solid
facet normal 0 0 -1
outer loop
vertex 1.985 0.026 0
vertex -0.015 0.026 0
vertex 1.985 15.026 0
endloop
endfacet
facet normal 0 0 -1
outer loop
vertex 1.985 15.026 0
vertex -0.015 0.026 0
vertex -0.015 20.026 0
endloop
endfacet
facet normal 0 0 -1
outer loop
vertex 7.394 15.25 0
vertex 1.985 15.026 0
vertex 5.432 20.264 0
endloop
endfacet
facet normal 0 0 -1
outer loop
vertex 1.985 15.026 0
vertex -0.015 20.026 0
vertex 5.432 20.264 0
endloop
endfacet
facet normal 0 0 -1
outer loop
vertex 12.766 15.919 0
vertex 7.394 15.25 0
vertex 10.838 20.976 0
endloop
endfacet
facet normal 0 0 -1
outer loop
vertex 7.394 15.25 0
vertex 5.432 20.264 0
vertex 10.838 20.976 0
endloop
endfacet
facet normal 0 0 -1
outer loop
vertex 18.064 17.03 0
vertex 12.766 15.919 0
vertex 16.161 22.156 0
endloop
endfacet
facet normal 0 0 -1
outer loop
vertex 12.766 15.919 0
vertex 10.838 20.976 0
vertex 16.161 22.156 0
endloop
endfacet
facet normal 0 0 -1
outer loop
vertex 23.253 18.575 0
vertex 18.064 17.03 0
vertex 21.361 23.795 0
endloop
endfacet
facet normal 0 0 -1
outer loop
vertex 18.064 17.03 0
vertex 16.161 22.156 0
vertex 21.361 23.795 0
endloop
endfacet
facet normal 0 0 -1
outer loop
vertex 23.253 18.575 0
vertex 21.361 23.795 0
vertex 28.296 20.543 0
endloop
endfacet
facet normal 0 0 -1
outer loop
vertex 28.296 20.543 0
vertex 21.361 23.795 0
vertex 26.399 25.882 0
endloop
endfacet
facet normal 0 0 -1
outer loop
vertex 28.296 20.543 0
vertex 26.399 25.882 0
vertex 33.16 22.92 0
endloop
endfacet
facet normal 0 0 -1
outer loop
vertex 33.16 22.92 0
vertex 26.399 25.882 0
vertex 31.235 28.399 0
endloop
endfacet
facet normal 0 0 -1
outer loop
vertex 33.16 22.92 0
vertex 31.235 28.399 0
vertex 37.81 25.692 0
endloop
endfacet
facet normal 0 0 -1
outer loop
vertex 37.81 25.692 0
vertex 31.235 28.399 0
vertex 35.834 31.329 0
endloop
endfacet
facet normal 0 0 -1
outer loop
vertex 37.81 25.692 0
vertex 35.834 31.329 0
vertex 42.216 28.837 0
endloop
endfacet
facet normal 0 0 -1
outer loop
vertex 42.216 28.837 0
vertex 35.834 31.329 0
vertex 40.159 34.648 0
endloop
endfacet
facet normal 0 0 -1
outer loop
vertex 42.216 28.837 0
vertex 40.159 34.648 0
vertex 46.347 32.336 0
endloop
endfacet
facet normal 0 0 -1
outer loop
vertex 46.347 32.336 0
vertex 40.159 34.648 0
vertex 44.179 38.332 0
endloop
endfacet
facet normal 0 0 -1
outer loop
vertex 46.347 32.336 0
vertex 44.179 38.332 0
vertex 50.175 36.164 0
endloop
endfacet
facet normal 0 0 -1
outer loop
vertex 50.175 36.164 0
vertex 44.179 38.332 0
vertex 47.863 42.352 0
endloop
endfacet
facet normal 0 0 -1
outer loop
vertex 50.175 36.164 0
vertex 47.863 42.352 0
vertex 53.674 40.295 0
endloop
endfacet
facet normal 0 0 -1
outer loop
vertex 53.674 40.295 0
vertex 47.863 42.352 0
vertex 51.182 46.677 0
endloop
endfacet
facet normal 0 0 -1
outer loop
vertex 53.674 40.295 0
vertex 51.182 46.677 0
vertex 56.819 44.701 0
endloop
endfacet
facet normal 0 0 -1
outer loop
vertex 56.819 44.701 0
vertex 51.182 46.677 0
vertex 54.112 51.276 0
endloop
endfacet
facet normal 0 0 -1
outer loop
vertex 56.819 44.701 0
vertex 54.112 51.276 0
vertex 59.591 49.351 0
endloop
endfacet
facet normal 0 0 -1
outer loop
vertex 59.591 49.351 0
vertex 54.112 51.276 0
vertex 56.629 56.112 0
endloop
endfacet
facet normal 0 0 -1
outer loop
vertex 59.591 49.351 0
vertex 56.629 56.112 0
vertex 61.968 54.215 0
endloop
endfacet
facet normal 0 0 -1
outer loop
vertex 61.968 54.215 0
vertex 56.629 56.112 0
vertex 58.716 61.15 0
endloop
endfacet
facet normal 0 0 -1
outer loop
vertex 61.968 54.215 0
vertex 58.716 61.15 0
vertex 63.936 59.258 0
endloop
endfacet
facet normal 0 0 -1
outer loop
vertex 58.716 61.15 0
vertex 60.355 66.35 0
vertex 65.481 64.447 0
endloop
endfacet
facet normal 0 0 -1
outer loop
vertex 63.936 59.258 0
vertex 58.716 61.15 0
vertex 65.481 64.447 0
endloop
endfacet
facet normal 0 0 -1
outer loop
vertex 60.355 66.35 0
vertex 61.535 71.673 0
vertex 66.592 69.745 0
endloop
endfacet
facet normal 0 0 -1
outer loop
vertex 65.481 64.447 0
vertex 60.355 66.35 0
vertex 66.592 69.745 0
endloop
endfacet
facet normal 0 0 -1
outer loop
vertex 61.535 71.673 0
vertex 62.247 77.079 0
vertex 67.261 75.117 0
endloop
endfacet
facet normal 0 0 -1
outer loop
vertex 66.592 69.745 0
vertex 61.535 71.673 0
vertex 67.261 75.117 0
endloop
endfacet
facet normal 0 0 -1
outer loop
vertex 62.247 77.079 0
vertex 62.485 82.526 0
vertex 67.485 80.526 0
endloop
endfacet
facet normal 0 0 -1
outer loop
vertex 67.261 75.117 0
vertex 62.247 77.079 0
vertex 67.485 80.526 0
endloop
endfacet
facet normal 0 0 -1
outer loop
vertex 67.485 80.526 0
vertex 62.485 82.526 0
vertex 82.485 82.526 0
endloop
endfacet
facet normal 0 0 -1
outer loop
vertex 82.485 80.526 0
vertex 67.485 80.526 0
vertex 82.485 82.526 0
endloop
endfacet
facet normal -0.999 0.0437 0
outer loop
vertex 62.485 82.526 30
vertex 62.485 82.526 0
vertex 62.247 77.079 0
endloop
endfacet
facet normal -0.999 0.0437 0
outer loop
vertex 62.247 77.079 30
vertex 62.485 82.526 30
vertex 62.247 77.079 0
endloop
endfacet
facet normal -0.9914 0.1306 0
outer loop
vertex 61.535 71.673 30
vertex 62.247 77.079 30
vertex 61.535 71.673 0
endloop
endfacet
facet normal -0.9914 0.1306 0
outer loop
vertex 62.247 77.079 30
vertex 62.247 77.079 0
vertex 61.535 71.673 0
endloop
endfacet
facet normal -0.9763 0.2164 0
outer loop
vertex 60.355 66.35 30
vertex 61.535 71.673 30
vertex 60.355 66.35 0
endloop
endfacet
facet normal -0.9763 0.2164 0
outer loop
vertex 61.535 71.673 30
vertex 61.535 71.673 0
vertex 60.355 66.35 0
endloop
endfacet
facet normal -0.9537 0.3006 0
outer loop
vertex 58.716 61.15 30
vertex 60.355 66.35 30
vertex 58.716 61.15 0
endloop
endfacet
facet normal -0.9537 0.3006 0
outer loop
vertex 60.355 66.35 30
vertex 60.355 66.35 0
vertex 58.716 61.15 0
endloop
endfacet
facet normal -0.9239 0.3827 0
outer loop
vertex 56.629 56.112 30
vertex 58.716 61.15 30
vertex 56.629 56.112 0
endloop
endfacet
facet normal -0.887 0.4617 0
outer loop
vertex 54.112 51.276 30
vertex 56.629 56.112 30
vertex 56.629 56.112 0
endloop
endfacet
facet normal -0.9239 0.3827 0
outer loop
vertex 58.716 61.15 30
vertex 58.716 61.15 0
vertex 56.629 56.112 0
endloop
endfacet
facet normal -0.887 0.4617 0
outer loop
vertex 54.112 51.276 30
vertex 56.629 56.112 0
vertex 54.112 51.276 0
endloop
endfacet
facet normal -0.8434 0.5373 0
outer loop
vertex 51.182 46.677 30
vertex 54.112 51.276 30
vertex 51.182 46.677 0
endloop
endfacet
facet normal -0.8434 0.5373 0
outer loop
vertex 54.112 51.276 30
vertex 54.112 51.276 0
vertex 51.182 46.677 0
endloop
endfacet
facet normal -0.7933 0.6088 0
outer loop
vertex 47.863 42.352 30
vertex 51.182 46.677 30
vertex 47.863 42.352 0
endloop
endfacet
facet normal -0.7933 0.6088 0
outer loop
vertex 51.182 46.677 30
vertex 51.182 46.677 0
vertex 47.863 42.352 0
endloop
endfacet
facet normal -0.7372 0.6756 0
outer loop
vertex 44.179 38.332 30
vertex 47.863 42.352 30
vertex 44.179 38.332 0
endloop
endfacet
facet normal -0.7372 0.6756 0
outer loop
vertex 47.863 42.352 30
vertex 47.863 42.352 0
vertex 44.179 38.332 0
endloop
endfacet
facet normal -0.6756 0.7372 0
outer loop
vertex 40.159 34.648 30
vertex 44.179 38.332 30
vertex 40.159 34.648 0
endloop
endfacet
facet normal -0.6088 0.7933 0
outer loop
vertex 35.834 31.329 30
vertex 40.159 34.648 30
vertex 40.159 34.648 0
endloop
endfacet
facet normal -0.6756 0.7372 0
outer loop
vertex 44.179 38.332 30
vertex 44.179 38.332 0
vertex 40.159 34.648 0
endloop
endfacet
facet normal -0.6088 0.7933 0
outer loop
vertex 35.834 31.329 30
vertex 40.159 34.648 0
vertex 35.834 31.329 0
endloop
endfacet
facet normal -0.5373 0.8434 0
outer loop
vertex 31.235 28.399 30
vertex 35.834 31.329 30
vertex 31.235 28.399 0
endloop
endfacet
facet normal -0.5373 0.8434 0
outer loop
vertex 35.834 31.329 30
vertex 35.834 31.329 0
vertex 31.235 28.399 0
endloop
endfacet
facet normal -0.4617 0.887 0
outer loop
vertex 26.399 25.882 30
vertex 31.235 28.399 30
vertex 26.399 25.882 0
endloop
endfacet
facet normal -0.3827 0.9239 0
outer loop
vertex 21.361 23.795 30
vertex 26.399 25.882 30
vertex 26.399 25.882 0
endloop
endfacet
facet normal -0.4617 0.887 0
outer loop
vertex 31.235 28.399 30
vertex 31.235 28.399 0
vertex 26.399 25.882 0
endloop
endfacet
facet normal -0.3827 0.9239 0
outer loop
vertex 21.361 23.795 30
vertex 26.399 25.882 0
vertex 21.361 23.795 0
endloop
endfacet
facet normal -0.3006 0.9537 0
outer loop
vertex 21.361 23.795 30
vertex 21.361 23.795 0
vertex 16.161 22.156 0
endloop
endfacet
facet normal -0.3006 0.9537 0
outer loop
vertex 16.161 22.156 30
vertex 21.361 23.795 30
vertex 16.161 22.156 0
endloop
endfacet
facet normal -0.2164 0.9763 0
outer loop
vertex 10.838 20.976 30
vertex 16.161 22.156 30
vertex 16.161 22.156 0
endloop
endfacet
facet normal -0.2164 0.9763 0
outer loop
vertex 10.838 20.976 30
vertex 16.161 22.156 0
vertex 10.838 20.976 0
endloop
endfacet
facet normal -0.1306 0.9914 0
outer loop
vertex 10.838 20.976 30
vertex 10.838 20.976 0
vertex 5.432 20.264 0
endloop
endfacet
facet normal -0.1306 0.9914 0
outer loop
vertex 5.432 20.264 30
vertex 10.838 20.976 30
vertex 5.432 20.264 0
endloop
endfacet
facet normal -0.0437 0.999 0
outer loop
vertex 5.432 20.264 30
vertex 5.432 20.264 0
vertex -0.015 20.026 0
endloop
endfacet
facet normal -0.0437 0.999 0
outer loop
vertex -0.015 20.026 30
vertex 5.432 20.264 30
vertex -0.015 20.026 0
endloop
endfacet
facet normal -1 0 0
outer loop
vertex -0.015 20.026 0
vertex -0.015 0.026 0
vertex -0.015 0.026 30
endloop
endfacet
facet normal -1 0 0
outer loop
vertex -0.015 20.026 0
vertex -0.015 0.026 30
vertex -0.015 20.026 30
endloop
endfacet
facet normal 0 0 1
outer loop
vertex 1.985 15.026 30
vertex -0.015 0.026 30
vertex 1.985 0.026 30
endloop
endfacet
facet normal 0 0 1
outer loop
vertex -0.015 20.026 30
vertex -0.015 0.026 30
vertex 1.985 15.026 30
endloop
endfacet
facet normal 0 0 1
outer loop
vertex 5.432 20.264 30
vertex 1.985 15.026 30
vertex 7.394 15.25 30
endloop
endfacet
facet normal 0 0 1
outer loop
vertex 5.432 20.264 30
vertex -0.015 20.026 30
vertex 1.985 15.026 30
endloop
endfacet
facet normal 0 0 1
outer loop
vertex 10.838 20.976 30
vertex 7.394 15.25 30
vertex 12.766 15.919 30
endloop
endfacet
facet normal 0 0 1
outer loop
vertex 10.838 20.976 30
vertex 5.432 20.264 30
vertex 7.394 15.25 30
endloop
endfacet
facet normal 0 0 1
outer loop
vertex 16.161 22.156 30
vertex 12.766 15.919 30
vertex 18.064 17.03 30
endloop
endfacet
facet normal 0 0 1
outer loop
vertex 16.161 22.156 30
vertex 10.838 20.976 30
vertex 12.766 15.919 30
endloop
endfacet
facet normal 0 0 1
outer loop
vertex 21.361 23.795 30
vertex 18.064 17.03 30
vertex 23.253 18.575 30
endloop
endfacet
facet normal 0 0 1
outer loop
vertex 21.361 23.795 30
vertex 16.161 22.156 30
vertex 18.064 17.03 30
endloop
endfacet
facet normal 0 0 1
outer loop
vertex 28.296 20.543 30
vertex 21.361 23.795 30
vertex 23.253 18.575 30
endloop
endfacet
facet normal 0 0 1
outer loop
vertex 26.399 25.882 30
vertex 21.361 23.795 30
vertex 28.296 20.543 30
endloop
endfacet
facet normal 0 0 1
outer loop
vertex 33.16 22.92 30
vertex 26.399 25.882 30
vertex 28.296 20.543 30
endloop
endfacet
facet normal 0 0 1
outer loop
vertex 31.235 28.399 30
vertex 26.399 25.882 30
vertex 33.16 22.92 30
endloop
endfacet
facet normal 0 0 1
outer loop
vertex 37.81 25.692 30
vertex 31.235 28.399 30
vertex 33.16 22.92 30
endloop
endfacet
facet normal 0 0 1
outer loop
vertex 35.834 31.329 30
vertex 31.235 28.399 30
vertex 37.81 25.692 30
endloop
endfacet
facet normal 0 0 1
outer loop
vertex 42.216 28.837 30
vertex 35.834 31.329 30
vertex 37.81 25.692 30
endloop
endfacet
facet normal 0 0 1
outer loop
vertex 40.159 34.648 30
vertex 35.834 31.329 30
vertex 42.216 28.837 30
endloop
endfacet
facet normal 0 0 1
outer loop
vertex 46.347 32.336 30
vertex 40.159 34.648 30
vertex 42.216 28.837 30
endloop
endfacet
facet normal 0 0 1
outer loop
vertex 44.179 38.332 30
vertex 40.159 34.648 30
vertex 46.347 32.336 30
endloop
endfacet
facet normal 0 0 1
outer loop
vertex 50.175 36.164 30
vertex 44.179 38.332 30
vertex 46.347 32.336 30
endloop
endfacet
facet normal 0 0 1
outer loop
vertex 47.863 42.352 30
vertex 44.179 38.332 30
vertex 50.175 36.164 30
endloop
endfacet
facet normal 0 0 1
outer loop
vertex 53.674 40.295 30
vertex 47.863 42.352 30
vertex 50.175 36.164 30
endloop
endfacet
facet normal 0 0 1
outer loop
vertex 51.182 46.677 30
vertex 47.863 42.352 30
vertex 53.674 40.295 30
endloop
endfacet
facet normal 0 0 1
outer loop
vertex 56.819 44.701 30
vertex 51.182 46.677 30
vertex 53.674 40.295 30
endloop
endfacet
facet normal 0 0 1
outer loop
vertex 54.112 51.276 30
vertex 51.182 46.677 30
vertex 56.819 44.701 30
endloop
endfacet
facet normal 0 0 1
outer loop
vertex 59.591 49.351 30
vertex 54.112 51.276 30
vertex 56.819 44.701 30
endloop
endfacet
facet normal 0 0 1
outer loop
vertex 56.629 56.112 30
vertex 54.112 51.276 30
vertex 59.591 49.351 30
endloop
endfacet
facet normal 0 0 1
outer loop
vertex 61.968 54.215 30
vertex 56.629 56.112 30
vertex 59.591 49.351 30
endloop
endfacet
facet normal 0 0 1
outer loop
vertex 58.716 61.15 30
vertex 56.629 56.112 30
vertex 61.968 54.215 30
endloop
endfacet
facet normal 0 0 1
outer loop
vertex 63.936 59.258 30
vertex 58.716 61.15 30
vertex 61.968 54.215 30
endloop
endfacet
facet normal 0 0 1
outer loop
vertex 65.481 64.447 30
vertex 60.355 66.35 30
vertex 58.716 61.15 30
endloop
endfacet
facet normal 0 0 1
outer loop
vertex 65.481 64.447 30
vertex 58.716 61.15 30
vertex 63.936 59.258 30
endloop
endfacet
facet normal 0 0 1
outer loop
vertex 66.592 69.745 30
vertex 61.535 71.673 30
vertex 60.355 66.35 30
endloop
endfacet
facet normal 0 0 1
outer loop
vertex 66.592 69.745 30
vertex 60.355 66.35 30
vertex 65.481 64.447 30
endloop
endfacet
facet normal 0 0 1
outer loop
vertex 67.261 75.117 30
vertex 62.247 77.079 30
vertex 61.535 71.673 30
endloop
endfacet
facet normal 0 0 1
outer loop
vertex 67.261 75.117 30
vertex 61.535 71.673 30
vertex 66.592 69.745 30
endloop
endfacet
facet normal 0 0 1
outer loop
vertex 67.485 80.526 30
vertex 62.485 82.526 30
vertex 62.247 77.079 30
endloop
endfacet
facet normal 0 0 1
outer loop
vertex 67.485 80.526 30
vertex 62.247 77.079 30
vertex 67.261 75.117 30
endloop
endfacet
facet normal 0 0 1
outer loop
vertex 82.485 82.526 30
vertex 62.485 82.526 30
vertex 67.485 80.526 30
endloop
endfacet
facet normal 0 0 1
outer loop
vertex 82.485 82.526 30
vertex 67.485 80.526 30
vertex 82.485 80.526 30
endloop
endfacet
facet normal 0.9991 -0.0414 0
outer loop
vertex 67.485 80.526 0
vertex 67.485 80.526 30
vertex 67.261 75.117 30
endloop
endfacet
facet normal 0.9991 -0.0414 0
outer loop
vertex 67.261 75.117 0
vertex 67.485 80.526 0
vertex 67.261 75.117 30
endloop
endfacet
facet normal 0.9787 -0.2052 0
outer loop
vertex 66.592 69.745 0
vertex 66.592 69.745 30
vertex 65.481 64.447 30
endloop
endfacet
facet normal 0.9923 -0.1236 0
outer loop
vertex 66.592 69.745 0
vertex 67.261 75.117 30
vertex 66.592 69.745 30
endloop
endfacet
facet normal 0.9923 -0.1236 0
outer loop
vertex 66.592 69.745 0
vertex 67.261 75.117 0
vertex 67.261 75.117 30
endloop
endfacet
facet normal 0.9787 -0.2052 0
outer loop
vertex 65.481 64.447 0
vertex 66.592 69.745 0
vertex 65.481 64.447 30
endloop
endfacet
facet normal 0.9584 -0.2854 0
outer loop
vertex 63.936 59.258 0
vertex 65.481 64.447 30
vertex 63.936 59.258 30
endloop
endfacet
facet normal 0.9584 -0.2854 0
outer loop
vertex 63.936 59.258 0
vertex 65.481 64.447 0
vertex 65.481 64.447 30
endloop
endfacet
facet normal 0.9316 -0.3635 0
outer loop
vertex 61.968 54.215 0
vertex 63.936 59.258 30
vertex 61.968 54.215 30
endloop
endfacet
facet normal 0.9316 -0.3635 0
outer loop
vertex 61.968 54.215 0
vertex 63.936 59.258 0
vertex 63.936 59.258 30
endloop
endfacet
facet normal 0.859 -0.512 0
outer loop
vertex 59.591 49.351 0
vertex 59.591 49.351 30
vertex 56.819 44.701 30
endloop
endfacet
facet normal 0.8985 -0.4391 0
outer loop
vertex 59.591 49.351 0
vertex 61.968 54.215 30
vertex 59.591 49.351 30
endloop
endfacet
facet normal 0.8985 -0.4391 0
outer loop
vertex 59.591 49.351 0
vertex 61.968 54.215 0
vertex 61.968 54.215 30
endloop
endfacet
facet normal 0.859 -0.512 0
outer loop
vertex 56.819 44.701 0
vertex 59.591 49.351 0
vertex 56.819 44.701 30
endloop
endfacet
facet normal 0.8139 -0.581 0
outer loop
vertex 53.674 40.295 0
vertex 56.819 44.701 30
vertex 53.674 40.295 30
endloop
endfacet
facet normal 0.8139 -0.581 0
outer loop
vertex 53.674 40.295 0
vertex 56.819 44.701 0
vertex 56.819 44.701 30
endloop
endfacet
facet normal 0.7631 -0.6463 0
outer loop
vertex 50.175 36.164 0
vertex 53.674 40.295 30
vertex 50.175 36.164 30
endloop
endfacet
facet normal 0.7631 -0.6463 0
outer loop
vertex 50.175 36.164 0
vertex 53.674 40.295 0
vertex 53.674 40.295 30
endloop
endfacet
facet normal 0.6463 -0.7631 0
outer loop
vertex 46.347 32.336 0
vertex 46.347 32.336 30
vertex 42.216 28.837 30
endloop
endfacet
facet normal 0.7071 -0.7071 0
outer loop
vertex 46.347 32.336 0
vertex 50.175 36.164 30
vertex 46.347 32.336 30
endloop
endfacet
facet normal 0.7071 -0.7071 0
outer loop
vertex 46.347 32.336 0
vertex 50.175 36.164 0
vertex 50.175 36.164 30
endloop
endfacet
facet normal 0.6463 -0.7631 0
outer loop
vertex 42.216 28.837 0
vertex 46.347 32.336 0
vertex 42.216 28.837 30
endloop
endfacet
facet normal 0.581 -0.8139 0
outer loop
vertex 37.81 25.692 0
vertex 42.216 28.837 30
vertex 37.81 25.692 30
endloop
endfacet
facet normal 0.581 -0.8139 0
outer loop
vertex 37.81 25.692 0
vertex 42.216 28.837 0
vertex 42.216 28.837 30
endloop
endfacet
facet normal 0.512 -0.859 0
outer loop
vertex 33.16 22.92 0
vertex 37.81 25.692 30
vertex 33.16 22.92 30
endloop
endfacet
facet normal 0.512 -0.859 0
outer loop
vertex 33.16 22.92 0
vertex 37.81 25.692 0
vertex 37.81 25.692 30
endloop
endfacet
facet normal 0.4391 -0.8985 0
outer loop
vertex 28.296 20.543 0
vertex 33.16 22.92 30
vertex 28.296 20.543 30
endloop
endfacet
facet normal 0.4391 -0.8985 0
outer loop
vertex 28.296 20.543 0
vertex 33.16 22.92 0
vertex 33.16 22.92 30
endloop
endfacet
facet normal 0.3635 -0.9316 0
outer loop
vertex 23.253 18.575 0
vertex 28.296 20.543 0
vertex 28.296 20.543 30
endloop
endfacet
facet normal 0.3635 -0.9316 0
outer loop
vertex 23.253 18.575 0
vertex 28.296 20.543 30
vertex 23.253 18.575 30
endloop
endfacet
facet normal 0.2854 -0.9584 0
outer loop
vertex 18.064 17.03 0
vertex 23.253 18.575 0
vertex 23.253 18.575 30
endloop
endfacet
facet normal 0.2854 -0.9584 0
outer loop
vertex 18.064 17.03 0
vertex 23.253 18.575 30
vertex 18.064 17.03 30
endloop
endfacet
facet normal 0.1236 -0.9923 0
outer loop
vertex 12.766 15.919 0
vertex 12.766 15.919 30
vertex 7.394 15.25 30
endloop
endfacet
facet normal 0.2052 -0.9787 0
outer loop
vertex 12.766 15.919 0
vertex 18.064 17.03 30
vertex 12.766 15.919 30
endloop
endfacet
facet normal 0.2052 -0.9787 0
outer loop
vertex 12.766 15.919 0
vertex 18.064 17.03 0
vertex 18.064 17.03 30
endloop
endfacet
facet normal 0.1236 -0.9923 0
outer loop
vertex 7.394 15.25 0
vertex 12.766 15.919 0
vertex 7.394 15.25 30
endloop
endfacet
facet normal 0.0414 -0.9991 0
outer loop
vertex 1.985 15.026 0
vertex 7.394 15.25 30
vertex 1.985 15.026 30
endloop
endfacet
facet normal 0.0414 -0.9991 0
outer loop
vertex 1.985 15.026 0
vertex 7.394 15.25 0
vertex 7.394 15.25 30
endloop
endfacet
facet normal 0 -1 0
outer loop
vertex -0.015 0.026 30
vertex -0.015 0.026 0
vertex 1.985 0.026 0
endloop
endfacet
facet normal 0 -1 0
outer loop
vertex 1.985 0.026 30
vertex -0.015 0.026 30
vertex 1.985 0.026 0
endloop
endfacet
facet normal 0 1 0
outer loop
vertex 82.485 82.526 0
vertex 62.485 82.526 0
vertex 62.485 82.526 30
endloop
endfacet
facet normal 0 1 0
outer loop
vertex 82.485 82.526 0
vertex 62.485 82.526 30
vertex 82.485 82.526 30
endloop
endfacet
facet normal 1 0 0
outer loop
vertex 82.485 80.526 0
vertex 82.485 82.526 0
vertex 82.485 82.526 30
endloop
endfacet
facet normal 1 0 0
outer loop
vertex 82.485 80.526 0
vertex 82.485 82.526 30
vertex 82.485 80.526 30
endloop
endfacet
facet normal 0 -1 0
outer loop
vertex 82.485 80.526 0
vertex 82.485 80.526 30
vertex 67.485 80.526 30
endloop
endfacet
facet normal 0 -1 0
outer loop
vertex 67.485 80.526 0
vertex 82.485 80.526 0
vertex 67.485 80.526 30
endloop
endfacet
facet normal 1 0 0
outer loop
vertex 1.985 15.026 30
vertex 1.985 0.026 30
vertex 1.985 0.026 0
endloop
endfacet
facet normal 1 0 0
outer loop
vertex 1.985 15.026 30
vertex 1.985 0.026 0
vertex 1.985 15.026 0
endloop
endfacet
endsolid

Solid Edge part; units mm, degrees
sketch "Sketch1" plane through (0, 0, 0) normal (0, 0, 1) x (1, 0, 0)
  line L0 (-0.015, 0.026) -> (1.985, 0.026)
  line L1 (1.985, 0.026) -> (1.985, 15.026)
  arc A0 (1.985, 15.026) -> (67.485, 80.526) centre (1.985, 80.526) ccw
  line L2 (82.485, 80.526) -> (67.485, 80.526)
  line L3 (82.485, 82.526) -> (82.485, 80.526)
  line L4 (62.485, 82.526) -> (82.485, 82.526)
  arc A1 (62.485, 82.526) -> (-0.015, 20.026) centre (-0.015, 82.526) cw
  line L5 (-0.015, 0.026) -> (-0.015, 20.026)
extrude "Protrusion1" add sketch "Sketch1" along normal blind 30
extrude "ExtrudedCutout_1" [suppressed]
